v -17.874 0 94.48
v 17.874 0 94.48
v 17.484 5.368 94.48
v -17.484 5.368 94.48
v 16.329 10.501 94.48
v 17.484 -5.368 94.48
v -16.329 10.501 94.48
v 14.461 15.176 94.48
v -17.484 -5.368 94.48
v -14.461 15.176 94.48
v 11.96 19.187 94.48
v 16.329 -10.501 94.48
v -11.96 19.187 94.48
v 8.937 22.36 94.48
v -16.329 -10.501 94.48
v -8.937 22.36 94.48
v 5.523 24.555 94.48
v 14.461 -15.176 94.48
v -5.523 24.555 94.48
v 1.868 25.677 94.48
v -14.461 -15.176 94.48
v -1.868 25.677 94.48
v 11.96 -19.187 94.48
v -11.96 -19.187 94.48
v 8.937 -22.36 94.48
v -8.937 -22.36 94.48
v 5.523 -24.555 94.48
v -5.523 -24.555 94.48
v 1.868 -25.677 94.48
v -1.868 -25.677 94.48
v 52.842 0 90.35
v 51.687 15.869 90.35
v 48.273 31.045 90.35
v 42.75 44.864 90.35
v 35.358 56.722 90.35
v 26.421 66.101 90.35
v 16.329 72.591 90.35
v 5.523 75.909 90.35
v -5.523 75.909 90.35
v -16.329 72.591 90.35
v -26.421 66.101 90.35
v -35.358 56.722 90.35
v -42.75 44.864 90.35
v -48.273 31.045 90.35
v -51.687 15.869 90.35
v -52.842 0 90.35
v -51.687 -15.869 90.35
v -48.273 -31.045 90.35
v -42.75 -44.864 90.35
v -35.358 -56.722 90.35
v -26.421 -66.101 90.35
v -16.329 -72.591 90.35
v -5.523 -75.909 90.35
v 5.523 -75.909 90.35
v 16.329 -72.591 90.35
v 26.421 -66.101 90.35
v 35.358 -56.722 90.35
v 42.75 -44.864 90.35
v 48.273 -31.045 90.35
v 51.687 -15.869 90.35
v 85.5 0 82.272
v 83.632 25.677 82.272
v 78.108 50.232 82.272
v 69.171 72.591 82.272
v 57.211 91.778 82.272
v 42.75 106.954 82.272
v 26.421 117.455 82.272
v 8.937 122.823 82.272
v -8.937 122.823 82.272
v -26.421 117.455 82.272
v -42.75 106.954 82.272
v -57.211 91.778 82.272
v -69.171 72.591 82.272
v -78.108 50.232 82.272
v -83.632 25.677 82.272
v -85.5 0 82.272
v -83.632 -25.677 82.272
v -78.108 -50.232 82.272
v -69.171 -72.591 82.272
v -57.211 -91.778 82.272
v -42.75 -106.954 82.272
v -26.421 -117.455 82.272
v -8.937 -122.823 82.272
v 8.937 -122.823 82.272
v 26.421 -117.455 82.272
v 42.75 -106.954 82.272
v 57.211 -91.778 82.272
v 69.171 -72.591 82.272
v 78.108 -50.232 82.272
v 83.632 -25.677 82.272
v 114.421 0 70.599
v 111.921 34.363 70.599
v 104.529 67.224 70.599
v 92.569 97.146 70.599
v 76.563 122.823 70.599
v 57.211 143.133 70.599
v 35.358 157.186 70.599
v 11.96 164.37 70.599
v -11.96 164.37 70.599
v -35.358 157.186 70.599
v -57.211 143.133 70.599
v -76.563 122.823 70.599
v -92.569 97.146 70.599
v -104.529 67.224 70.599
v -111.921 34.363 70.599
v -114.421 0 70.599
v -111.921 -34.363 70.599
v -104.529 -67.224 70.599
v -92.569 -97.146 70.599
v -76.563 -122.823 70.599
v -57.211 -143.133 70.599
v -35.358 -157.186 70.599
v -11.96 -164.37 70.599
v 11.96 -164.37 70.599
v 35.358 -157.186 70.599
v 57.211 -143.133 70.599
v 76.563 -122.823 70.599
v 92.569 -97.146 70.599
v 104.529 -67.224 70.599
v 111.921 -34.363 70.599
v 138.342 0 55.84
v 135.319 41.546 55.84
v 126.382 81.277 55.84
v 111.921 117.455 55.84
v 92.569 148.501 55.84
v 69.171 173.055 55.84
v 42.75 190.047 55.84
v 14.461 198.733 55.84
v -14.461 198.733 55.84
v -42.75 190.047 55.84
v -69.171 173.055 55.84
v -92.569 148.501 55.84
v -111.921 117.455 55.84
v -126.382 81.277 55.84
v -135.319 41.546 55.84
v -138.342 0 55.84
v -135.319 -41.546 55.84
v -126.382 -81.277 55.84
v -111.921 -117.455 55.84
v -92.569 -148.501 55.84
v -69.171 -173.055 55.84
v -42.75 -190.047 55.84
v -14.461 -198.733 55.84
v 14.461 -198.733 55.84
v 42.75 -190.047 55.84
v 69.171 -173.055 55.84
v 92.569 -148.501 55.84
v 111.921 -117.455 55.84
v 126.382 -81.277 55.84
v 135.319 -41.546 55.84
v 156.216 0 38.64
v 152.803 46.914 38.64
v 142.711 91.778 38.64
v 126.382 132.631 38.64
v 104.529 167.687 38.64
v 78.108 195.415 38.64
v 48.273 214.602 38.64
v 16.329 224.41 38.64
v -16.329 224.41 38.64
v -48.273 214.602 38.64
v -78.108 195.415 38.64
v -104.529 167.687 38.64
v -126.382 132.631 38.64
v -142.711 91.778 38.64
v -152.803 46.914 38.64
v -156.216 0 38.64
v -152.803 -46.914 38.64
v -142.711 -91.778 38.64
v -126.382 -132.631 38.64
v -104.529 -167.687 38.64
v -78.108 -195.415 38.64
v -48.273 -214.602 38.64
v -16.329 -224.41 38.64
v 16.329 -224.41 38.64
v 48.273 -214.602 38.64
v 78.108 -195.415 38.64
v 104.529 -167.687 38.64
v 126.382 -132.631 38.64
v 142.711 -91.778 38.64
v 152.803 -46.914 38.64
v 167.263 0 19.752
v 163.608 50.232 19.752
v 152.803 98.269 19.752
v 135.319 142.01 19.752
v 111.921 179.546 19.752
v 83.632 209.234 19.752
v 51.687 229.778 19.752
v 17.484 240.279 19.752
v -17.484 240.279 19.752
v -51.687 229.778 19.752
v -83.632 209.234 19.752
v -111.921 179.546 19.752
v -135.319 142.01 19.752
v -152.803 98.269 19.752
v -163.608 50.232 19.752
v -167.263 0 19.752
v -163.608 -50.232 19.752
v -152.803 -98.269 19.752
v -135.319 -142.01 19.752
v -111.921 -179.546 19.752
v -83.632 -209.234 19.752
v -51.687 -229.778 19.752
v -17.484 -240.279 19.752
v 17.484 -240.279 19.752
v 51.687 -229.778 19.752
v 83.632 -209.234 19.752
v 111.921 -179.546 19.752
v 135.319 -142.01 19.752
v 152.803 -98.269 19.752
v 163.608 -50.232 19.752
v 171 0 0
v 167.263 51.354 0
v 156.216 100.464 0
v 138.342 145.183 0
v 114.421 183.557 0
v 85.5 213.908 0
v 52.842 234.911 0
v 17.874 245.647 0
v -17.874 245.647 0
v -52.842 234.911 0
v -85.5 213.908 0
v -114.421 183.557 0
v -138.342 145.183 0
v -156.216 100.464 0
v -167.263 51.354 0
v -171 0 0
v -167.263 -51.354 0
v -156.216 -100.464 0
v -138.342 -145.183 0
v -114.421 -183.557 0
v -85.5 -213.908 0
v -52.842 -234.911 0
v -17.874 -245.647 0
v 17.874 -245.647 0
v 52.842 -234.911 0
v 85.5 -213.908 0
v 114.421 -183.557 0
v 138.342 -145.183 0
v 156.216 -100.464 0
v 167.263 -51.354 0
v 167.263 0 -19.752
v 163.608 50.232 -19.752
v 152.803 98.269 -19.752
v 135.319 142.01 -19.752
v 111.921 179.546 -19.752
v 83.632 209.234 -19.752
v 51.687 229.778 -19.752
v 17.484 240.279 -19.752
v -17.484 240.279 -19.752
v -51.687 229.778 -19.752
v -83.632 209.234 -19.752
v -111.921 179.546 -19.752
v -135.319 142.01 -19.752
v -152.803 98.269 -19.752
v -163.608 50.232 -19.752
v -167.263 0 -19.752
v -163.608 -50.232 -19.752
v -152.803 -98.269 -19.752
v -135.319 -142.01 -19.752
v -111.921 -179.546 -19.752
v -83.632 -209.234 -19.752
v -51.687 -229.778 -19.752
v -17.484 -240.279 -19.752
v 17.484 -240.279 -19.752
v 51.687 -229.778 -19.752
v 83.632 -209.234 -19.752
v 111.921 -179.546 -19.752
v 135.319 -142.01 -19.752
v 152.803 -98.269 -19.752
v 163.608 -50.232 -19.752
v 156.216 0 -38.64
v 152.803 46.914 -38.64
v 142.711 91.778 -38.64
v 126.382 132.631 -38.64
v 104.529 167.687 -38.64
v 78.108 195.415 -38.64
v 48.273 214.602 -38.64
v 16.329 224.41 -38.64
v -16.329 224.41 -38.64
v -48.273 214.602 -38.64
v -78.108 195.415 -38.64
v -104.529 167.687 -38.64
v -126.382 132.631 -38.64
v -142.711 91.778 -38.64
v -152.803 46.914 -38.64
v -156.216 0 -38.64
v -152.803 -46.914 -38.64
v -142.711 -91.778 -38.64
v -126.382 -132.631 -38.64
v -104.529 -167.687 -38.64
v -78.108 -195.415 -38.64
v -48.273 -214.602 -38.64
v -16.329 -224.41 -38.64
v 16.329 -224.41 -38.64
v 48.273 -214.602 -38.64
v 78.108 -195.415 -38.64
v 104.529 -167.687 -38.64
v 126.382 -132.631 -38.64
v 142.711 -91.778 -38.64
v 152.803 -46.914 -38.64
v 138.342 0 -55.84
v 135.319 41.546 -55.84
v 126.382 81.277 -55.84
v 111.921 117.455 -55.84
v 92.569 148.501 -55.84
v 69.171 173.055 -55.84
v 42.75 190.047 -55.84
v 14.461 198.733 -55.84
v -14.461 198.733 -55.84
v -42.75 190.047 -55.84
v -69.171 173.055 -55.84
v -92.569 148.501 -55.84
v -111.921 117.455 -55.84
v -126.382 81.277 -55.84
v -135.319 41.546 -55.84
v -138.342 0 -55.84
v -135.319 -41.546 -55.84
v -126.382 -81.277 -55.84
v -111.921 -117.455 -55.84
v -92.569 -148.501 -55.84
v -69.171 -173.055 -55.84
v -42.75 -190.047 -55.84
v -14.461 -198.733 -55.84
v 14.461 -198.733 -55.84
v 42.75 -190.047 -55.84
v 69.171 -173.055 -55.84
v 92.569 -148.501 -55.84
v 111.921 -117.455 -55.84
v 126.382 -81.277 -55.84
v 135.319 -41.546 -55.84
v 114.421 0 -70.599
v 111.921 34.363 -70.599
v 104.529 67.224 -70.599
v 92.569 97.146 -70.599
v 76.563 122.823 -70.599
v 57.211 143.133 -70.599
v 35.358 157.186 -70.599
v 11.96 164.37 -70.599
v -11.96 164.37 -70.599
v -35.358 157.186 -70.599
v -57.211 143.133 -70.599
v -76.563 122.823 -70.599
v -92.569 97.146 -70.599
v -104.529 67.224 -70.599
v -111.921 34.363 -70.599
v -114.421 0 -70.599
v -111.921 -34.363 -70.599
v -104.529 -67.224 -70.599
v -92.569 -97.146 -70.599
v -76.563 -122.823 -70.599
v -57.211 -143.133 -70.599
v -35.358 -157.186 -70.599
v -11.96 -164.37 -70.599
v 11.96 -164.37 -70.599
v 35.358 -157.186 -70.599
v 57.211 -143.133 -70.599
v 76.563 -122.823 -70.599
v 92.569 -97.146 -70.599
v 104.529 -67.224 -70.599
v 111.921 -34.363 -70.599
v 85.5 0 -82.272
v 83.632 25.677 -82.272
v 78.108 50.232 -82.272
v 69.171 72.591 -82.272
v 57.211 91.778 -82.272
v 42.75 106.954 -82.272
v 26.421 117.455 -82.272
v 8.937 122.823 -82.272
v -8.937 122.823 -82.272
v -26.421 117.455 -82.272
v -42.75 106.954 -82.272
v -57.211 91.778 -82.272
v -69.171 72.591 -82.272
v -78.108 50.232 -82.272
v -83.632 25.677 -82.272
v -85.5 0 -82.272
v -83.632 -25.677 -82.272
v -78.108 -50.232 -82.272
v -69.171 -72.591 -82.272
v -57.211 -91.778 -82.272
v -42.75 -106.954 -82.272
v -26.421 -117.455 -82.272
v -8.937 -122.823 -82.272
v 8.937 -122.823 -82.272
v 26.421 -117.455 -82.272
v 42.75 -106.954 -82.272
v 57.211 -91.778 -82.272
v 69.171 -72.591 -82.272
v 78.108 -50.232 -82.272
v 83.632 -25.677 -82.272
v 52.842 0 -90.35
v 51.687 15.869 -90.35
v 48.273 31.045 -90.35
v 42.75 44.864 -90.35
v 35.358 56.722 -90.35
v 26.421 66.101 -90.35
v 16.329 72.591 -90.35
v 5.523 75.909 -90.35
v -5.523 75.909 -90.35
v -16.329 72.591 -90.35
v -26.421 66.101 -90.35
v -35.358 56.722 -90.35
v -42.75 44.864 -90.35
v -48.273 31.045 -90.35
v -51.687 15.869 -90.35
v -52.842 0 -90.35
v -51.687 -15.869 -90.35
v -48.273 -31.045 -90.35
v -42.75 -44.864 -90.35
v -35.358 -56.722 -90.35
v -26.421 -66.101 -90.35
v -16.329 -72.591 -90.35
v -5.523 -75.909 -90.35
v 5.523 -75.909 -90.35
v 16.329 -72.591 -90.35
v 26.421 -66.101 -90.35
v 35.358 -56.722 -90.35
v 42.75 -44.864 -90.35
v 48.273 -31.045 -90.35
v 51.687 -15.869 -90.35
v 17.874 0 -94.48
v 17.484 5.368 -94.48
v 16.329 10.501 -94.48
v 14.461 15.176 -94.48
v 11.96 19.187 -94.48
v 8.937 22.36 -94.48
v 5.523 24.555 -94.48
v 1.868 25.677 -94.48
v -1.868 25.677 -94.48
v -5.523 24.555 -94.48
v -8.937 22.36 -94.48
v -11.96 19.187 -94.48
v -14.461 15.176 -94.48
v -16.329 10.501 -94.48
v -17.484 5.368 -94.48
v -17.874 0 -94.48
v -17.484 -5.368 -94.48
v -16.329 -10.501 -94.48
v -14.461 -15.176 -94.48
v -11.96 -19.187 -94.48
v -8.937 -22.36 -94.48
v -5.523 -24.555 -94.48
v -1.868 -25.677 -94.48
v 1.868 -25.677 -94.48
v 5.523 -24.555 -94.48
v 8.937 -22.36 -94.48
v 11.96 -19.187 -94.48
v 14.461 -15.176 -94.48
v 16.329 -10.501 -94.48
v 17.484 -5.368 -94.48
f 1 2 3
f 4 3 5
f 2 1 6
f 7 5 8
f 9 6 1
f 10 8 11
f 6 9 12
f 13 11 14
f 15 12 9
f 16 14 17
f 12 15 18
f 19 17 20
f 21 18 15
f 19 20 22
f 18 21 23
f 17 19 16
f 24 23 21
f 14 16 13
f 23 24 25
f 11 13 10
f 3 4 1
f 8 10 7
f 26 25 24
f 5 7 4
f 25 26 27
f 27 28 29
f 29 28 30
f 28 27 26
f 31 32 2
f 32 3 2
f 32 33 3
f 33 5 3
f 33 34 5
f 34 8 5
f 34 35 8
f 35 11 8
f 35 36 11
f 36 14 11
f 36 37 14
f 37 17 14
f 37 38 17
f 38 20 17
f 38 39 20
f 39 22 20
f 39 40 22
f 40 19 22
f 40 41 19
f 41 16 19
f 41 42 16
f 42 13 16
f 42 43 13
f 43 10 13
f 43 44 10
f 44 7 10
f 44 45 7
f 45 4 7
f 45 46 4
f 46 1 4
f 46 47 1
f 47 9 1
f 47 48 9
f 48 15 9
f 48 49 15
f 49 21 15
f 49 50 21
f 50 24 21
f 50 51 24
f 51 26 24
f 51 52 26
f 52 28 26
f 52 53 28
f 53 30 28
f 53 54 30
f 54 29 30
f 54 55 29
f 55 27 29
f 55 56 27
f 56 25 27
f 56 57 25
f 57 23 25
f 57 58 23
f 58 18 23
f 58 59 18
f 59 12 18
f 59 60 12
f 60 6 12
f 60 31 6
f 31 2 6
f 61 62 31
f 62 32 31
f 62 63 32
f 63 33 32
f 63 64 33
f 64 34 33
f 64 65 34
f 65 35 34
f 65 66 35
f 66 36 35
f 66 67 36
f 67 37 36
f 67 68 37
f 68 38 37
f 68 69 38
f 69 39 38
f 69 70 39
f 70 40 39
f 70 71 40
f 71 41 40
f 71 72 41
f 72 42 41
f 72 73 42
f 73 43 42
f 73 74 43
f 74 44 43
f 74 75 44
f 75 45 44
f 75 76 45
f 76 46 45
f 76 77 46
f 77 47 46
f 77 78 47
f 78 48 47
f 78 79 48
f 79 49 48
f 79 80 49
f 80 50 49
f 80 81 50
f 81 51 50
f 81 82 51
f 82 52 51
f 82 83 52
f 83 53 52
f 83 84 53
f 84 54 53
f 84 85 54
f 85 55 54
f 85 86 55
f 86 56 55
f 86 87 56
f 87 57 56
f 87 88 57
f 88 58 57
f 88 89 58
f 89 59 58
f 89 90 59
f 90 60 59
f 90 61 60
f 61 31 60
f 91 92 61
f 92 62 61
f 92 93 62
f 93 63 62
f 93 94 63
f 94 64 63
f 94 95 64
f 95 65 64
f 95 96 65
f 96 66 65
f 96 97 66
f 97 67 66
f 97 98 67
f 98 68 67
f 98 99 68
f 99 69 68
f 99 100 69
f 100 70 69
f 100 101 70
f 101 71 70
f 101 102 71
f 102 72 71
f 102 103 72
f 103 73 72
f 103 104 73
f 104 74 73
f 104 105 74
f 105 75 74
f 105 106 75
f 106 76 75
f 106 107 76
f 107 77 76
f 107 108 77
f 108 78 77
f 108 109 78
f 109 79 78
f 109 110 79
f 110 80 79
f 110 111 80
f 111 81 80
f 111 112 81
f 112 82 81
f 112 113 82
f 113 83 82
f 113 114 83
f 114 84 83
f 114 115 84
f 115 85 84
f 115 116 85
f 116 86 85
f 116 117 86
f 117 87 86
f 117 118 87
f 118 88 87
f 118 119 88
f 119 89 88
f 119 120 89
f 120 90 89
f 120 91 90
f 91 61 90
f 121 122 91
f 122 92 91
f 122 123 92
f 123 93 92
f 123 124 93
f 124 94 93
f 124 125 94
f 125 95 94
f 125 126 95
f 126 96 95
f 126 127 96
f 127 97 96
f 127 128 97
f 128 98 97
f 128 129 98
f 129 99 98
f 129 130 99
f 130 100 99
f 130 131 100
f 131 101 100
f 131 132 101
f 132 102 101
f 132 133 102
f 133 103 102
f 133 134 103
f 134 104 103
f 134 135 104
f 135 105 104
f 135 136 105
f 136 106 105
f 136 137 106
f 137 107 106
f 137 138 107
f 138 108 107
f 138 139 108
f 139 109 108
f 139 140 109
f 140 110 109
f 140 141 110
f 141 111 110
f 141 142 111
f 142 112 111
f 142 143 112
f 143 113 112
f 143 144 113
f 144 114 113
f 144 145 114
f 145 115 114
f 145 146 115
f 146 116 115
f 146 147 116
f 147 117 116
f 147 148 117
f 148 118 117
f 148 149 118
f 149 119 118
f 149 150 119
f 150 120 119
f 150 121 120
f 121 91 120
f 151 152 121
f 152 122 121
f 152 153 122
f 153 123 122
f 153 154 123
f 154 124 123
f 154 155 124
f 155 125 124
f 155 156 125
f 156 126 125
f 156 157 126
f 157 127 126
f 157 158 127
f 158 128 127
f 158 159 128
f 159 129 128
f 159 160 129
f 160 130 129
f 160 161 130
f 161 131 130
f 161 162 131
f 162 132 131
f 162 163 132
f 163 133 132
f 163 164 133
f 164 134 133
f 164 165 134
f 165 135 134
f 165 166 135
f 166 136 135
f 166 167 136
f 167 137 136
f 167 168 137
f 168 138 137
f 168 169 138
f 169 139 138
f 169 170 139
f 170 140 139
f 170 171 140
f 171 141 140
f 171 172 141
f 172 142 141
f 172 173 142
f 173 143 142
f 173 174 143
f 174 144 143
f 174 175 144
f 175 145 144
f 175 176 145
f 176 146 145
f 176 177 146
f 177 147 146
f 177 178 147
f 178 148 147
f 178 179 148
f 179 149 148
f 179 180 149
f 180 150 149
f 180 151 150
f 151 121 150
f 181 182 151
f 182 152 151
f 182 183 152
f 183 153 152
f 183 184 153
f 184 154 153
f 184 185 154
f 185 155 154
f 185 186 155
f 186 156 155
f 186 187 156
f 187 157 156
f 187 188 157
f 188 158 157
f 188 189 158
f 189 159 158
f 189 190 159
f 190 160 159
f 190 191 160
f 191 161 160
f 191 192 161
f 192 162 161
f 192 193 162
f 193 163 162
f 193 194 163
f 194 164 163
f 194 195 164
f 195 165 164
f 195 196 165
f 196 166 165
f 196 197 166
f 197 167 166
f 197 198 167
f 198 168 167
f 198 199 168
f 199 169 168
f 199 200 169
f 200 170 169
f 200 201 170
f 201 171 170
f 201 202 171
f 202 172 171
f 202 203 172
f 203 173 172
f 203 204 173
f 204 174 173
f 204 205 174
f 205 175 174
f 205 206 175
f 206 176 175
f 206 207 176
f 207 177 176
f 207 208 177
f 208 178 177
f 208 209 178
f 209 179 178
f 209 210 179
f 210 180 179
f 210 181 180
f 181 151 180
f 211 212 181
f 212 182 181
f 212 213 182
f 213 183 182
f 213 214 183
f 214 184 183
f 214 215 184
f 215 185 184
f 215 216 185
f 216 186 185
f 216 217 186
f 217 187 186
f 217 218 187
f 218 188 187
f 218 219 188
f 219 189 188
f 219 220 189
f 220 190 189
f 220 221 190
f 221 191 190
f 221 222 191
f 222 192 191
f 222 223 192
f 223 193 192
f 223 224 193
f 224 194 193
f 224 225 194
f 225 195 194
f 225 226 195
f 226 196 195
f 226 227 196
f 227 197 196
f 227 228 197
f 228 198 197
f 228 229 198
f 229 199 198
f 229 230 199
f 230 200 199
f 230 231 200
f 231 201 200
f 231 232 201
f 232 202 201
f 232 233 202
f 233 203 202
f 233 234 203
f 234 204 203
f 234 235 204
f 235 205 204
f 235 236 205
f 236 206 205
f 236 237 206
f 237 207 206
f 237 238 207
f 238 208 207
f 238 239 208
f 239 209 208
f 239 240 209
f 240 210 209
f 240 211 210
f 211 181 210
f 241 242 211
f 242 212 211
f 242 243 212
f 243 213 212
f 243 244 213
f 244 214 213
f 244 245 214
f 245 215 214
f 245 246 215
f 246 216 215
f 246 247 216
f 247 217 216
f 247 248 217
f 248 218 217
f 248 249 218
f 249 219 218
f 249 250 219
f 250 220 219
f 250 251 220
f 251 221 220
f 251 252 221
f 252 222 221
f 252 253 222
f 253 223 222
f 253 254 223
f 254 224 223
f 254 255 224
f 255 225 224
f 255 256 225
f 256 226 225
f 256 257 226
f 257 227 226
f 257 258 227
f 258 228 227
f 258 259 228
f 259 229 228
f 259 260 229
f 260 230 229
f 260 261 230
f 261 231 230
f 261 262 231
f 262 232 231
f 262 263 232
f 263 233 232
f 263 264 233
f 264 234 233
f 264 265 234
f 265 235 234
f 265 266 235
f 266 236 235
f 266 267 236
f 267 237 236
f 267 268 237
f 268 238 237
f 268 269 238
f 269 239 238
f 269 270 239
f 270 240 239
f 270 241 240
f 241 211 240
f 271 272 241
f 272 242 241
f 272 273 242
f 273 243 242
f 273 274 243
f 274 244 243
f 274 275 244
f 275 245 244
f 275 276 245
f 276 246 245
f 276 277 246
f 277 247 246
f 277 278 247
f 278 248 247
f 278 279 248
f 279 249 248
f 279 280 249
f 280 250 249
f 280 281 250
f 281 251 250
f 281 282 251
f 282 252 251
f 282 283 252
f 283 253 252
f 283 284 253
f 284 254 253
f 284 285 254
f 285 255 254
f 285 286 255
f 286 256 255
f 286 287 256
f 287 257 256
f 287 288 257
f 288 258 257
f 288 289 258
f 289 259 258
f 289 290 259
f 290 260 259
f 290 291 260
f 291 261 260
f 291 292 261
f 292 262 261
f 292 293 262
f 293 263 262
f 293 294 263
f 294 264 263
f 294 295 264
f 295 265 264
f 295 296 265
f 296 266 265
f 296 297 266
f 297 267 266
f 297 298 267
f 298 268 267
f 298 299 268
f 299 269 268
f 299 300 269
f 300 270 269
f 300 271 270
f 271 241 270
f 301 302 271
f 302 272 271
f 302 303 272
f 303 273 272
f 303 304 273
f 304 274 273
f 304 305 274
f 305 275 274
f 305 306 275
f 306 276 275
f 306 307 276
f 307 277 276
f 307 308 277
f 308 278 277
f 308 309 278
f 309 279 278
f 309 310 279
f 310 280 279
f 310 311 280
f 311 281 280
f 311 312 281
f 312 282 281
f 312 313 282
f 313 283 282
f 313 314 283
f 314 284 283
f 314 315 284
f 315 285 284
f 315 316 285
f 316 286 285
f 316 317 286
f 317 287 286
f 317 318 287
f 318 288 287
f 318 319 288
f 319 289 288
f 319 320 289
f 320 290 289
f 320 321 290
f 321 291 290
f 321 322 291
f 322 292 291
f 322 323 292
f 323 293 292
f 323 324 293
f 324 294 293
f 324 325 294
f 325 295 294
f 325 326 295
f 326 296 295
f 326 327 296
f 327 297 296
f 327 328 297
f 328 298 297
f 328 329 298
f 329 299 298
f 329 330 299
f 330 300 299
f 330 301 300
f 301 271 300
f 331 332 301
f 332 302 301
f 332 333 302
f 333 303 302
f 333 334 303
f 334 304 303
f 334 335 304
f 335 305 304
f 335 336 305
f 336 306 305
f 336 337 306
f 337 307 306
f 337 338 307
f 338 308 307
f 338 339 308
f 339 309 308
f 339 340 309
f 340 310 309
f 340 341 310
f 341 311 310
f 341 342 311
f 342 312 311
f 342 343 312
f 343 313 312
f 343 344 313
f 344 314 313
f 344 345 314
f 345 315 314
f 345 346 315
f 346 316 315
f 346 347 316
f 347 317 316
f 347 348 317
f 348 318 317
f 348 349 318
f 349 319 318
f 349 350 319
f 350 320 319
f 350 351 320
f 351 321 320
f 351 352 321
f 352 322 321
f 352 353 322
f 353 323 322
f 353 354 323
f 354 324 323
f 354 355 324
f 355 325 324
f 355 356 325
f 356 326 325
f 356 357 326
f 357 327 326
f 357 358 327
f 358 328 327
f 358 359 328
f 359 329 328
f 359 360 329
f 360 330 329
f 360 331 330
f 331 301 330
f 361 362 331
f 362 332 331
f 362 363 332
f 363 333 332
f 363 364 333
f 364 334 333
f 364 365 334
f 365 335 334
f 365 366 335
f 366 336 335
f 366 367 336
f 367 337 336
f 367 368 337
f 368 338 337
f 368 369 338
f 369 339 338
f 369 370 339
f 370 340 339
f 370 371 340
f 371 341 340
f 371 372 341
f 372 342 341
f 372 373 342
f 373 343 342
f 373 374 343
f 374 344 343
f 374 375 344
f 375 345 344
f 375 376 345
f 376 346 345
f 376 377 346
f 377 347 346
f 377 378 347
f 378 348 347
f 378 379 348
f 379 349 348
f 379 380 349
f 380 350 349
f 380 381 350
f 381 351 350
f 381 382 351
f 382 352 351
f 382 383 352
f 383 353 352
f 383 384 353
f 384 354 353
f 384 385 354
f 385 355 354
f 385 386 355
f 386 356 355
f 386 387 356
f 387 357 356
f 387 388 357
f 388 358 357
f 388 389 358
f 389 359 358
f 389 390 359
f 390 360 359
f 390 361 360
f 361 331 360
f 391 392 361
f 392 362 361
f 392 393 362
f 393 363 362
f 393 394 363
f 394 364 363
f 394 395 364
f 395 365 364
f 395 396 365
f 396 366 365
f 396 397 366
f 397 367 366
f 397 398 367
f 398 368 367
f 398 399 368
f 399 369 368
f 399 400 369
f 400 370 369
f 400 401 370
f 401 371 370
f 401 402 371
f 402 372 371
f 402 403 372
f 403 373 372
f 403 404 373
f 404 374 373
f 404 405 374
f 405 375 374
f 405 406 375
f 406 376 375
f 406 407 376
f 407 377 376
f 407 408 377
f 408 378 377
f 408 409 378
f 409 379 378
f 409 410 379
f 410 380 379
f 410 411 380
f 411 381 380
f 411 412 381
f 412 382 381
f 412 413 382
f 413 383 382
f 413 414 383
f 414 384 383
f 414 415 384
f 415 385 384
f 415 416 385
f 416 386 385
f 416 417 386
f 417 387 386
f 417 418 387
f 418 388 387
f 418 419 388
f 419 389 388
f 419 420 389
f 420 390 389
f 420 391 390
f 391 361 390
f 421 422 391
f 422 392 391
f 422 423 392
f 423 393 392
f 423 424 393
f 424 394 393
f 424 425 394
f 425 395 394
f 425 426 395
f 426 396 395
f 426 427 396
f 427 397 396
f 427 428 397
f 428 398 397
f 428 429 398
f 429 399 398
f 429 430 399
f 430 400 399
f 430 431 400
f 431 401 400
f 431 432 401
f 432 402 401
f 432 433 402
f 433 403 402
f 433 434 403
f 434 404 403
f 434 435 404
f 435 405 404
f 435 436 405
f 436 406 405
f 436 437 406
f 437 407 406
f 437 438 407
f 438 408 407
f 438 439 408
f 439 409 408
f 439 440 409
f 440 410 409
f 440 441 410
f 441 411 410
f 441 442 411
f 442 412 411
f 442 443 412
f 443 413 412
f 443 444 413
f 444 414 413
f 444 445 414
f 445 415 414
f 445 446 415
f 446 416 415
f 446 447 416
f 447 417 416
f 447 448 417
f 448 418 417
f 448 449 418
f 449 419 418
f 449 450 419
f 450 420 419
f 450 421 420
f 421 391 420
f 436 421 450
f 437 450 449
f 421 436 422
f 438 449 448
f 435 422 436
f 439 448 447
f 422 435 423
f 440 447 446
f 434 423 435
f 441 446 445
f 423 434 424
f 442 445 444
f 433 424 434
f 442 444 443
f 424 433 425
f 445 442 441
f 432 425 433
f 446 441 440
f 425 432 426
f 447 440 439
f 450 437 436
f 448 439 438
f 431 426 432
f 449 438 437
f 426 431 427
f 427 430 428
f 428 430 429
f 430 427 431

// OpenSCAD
// Generated by SolidPython 1.0.1 on 2020-07-29 00:46:48


scale(v = [9, 13, 5]) {
	sphere(r = 19);
}
/***********************************************
*********      SolidPython code:      **********
************************************************
 
# import packages: SolidPython
from solid import *
from solid.utils import *
from itertools import chain, combinations, permutations


class Resize:

    def __init__(self, scad_file):
        self.scad_file = scad_file
        #self.scad_file = import_scad(scad_file)
        # cone/cylinder param:
        self.r1 = 0
        self.r2 = 0
        self.h = 0
        # rectangular prism param:
        self.w = 0
        self.l = 0
        # ellipse param:
        self.r = 0

    # import OpenScad code (file name corresponds to shape)


    # classify shape + parameters
    def assign(self, param1, param2, param3):
        if self.scad_file == 'cone.scad':
            self.r1 = param1
            self.r2 = param2
            self.h = param3
        elif self.scad_file == 'cylinder.scad':
            self.r1 = param1
            self.r2 = param2
            self.h = param3
        elif self.scad_file == 'rectangularPrism.scad':
            self.h = param1
            self.l = param2
            self.w = param3
        else:
            self.r = param1
            self.h = param2

    # resize parameters
    def iterate(self):
        x = range(3, 20, 2)
        i = 1
        if self.scad_file == 'cone.scad':
            tempList = list(permutations(x, 2))
            for temp in tempList:
                param1 = temp[0]
                param2 = temp[1]
                filepath = 'produced_scad_files/' + 'cone' + str(param1) + '_' + str(param2) + '_' + '.scad'
                scad_render_to_file(cylinder(h=param1, r1=param2, r2=0), filepath)

        elif self.scad_file == 'cylinder.scad':
            tempList = list(permutations(x, 3))
            for temp in tempList:
                param1 = temp[0]
                param2 = temp[1]
                filepath = 'produced_scad_files/' + 'cylinder' + str(param1) + '_' + str(param2) + '_' + '.scad'
                scad_render_to_file(cylinder(h=param1, r1=param2, r2=param2), filepath)

        elif self.scad_file == 'rectangularPrism.scad':
            tempList = list(permutations(x, 3))
            for temp in tempList:
                param1 = temp[0]
                param2 = temp[1]
                param3 = temp[2]
                filepath = 'produced_scad_files/' + 'rectangularPrism' + str(param1) + '_' + str(param2) + '_' + str(
                    param3) + '.scad'
                scad_render_to_file(cube(size=(param1, param2, param3)), filepath)

        elif self.scad_file == 'ellipse.scad':
            tempList = list(permutations(x, 4))
            for temp in tempList:
                param1 = temp[0]
                param2 = temp[1]
                param3 = temp[2]
                param4 = temp[3]
                filepath = 'produced_scad_files/' + 'ellipse' + str(param1) + '_' + str(param2) + '_' + str(param3) + '_' + str(param4) + '.scad'
                scad_render_to_file(scale([param1, param2, param3])(sphere(r=param4)), filepath)

    def render_to_scadfile(self):
        scad_render_to_file(scad, 'example.scad') 
 
************************************************/
